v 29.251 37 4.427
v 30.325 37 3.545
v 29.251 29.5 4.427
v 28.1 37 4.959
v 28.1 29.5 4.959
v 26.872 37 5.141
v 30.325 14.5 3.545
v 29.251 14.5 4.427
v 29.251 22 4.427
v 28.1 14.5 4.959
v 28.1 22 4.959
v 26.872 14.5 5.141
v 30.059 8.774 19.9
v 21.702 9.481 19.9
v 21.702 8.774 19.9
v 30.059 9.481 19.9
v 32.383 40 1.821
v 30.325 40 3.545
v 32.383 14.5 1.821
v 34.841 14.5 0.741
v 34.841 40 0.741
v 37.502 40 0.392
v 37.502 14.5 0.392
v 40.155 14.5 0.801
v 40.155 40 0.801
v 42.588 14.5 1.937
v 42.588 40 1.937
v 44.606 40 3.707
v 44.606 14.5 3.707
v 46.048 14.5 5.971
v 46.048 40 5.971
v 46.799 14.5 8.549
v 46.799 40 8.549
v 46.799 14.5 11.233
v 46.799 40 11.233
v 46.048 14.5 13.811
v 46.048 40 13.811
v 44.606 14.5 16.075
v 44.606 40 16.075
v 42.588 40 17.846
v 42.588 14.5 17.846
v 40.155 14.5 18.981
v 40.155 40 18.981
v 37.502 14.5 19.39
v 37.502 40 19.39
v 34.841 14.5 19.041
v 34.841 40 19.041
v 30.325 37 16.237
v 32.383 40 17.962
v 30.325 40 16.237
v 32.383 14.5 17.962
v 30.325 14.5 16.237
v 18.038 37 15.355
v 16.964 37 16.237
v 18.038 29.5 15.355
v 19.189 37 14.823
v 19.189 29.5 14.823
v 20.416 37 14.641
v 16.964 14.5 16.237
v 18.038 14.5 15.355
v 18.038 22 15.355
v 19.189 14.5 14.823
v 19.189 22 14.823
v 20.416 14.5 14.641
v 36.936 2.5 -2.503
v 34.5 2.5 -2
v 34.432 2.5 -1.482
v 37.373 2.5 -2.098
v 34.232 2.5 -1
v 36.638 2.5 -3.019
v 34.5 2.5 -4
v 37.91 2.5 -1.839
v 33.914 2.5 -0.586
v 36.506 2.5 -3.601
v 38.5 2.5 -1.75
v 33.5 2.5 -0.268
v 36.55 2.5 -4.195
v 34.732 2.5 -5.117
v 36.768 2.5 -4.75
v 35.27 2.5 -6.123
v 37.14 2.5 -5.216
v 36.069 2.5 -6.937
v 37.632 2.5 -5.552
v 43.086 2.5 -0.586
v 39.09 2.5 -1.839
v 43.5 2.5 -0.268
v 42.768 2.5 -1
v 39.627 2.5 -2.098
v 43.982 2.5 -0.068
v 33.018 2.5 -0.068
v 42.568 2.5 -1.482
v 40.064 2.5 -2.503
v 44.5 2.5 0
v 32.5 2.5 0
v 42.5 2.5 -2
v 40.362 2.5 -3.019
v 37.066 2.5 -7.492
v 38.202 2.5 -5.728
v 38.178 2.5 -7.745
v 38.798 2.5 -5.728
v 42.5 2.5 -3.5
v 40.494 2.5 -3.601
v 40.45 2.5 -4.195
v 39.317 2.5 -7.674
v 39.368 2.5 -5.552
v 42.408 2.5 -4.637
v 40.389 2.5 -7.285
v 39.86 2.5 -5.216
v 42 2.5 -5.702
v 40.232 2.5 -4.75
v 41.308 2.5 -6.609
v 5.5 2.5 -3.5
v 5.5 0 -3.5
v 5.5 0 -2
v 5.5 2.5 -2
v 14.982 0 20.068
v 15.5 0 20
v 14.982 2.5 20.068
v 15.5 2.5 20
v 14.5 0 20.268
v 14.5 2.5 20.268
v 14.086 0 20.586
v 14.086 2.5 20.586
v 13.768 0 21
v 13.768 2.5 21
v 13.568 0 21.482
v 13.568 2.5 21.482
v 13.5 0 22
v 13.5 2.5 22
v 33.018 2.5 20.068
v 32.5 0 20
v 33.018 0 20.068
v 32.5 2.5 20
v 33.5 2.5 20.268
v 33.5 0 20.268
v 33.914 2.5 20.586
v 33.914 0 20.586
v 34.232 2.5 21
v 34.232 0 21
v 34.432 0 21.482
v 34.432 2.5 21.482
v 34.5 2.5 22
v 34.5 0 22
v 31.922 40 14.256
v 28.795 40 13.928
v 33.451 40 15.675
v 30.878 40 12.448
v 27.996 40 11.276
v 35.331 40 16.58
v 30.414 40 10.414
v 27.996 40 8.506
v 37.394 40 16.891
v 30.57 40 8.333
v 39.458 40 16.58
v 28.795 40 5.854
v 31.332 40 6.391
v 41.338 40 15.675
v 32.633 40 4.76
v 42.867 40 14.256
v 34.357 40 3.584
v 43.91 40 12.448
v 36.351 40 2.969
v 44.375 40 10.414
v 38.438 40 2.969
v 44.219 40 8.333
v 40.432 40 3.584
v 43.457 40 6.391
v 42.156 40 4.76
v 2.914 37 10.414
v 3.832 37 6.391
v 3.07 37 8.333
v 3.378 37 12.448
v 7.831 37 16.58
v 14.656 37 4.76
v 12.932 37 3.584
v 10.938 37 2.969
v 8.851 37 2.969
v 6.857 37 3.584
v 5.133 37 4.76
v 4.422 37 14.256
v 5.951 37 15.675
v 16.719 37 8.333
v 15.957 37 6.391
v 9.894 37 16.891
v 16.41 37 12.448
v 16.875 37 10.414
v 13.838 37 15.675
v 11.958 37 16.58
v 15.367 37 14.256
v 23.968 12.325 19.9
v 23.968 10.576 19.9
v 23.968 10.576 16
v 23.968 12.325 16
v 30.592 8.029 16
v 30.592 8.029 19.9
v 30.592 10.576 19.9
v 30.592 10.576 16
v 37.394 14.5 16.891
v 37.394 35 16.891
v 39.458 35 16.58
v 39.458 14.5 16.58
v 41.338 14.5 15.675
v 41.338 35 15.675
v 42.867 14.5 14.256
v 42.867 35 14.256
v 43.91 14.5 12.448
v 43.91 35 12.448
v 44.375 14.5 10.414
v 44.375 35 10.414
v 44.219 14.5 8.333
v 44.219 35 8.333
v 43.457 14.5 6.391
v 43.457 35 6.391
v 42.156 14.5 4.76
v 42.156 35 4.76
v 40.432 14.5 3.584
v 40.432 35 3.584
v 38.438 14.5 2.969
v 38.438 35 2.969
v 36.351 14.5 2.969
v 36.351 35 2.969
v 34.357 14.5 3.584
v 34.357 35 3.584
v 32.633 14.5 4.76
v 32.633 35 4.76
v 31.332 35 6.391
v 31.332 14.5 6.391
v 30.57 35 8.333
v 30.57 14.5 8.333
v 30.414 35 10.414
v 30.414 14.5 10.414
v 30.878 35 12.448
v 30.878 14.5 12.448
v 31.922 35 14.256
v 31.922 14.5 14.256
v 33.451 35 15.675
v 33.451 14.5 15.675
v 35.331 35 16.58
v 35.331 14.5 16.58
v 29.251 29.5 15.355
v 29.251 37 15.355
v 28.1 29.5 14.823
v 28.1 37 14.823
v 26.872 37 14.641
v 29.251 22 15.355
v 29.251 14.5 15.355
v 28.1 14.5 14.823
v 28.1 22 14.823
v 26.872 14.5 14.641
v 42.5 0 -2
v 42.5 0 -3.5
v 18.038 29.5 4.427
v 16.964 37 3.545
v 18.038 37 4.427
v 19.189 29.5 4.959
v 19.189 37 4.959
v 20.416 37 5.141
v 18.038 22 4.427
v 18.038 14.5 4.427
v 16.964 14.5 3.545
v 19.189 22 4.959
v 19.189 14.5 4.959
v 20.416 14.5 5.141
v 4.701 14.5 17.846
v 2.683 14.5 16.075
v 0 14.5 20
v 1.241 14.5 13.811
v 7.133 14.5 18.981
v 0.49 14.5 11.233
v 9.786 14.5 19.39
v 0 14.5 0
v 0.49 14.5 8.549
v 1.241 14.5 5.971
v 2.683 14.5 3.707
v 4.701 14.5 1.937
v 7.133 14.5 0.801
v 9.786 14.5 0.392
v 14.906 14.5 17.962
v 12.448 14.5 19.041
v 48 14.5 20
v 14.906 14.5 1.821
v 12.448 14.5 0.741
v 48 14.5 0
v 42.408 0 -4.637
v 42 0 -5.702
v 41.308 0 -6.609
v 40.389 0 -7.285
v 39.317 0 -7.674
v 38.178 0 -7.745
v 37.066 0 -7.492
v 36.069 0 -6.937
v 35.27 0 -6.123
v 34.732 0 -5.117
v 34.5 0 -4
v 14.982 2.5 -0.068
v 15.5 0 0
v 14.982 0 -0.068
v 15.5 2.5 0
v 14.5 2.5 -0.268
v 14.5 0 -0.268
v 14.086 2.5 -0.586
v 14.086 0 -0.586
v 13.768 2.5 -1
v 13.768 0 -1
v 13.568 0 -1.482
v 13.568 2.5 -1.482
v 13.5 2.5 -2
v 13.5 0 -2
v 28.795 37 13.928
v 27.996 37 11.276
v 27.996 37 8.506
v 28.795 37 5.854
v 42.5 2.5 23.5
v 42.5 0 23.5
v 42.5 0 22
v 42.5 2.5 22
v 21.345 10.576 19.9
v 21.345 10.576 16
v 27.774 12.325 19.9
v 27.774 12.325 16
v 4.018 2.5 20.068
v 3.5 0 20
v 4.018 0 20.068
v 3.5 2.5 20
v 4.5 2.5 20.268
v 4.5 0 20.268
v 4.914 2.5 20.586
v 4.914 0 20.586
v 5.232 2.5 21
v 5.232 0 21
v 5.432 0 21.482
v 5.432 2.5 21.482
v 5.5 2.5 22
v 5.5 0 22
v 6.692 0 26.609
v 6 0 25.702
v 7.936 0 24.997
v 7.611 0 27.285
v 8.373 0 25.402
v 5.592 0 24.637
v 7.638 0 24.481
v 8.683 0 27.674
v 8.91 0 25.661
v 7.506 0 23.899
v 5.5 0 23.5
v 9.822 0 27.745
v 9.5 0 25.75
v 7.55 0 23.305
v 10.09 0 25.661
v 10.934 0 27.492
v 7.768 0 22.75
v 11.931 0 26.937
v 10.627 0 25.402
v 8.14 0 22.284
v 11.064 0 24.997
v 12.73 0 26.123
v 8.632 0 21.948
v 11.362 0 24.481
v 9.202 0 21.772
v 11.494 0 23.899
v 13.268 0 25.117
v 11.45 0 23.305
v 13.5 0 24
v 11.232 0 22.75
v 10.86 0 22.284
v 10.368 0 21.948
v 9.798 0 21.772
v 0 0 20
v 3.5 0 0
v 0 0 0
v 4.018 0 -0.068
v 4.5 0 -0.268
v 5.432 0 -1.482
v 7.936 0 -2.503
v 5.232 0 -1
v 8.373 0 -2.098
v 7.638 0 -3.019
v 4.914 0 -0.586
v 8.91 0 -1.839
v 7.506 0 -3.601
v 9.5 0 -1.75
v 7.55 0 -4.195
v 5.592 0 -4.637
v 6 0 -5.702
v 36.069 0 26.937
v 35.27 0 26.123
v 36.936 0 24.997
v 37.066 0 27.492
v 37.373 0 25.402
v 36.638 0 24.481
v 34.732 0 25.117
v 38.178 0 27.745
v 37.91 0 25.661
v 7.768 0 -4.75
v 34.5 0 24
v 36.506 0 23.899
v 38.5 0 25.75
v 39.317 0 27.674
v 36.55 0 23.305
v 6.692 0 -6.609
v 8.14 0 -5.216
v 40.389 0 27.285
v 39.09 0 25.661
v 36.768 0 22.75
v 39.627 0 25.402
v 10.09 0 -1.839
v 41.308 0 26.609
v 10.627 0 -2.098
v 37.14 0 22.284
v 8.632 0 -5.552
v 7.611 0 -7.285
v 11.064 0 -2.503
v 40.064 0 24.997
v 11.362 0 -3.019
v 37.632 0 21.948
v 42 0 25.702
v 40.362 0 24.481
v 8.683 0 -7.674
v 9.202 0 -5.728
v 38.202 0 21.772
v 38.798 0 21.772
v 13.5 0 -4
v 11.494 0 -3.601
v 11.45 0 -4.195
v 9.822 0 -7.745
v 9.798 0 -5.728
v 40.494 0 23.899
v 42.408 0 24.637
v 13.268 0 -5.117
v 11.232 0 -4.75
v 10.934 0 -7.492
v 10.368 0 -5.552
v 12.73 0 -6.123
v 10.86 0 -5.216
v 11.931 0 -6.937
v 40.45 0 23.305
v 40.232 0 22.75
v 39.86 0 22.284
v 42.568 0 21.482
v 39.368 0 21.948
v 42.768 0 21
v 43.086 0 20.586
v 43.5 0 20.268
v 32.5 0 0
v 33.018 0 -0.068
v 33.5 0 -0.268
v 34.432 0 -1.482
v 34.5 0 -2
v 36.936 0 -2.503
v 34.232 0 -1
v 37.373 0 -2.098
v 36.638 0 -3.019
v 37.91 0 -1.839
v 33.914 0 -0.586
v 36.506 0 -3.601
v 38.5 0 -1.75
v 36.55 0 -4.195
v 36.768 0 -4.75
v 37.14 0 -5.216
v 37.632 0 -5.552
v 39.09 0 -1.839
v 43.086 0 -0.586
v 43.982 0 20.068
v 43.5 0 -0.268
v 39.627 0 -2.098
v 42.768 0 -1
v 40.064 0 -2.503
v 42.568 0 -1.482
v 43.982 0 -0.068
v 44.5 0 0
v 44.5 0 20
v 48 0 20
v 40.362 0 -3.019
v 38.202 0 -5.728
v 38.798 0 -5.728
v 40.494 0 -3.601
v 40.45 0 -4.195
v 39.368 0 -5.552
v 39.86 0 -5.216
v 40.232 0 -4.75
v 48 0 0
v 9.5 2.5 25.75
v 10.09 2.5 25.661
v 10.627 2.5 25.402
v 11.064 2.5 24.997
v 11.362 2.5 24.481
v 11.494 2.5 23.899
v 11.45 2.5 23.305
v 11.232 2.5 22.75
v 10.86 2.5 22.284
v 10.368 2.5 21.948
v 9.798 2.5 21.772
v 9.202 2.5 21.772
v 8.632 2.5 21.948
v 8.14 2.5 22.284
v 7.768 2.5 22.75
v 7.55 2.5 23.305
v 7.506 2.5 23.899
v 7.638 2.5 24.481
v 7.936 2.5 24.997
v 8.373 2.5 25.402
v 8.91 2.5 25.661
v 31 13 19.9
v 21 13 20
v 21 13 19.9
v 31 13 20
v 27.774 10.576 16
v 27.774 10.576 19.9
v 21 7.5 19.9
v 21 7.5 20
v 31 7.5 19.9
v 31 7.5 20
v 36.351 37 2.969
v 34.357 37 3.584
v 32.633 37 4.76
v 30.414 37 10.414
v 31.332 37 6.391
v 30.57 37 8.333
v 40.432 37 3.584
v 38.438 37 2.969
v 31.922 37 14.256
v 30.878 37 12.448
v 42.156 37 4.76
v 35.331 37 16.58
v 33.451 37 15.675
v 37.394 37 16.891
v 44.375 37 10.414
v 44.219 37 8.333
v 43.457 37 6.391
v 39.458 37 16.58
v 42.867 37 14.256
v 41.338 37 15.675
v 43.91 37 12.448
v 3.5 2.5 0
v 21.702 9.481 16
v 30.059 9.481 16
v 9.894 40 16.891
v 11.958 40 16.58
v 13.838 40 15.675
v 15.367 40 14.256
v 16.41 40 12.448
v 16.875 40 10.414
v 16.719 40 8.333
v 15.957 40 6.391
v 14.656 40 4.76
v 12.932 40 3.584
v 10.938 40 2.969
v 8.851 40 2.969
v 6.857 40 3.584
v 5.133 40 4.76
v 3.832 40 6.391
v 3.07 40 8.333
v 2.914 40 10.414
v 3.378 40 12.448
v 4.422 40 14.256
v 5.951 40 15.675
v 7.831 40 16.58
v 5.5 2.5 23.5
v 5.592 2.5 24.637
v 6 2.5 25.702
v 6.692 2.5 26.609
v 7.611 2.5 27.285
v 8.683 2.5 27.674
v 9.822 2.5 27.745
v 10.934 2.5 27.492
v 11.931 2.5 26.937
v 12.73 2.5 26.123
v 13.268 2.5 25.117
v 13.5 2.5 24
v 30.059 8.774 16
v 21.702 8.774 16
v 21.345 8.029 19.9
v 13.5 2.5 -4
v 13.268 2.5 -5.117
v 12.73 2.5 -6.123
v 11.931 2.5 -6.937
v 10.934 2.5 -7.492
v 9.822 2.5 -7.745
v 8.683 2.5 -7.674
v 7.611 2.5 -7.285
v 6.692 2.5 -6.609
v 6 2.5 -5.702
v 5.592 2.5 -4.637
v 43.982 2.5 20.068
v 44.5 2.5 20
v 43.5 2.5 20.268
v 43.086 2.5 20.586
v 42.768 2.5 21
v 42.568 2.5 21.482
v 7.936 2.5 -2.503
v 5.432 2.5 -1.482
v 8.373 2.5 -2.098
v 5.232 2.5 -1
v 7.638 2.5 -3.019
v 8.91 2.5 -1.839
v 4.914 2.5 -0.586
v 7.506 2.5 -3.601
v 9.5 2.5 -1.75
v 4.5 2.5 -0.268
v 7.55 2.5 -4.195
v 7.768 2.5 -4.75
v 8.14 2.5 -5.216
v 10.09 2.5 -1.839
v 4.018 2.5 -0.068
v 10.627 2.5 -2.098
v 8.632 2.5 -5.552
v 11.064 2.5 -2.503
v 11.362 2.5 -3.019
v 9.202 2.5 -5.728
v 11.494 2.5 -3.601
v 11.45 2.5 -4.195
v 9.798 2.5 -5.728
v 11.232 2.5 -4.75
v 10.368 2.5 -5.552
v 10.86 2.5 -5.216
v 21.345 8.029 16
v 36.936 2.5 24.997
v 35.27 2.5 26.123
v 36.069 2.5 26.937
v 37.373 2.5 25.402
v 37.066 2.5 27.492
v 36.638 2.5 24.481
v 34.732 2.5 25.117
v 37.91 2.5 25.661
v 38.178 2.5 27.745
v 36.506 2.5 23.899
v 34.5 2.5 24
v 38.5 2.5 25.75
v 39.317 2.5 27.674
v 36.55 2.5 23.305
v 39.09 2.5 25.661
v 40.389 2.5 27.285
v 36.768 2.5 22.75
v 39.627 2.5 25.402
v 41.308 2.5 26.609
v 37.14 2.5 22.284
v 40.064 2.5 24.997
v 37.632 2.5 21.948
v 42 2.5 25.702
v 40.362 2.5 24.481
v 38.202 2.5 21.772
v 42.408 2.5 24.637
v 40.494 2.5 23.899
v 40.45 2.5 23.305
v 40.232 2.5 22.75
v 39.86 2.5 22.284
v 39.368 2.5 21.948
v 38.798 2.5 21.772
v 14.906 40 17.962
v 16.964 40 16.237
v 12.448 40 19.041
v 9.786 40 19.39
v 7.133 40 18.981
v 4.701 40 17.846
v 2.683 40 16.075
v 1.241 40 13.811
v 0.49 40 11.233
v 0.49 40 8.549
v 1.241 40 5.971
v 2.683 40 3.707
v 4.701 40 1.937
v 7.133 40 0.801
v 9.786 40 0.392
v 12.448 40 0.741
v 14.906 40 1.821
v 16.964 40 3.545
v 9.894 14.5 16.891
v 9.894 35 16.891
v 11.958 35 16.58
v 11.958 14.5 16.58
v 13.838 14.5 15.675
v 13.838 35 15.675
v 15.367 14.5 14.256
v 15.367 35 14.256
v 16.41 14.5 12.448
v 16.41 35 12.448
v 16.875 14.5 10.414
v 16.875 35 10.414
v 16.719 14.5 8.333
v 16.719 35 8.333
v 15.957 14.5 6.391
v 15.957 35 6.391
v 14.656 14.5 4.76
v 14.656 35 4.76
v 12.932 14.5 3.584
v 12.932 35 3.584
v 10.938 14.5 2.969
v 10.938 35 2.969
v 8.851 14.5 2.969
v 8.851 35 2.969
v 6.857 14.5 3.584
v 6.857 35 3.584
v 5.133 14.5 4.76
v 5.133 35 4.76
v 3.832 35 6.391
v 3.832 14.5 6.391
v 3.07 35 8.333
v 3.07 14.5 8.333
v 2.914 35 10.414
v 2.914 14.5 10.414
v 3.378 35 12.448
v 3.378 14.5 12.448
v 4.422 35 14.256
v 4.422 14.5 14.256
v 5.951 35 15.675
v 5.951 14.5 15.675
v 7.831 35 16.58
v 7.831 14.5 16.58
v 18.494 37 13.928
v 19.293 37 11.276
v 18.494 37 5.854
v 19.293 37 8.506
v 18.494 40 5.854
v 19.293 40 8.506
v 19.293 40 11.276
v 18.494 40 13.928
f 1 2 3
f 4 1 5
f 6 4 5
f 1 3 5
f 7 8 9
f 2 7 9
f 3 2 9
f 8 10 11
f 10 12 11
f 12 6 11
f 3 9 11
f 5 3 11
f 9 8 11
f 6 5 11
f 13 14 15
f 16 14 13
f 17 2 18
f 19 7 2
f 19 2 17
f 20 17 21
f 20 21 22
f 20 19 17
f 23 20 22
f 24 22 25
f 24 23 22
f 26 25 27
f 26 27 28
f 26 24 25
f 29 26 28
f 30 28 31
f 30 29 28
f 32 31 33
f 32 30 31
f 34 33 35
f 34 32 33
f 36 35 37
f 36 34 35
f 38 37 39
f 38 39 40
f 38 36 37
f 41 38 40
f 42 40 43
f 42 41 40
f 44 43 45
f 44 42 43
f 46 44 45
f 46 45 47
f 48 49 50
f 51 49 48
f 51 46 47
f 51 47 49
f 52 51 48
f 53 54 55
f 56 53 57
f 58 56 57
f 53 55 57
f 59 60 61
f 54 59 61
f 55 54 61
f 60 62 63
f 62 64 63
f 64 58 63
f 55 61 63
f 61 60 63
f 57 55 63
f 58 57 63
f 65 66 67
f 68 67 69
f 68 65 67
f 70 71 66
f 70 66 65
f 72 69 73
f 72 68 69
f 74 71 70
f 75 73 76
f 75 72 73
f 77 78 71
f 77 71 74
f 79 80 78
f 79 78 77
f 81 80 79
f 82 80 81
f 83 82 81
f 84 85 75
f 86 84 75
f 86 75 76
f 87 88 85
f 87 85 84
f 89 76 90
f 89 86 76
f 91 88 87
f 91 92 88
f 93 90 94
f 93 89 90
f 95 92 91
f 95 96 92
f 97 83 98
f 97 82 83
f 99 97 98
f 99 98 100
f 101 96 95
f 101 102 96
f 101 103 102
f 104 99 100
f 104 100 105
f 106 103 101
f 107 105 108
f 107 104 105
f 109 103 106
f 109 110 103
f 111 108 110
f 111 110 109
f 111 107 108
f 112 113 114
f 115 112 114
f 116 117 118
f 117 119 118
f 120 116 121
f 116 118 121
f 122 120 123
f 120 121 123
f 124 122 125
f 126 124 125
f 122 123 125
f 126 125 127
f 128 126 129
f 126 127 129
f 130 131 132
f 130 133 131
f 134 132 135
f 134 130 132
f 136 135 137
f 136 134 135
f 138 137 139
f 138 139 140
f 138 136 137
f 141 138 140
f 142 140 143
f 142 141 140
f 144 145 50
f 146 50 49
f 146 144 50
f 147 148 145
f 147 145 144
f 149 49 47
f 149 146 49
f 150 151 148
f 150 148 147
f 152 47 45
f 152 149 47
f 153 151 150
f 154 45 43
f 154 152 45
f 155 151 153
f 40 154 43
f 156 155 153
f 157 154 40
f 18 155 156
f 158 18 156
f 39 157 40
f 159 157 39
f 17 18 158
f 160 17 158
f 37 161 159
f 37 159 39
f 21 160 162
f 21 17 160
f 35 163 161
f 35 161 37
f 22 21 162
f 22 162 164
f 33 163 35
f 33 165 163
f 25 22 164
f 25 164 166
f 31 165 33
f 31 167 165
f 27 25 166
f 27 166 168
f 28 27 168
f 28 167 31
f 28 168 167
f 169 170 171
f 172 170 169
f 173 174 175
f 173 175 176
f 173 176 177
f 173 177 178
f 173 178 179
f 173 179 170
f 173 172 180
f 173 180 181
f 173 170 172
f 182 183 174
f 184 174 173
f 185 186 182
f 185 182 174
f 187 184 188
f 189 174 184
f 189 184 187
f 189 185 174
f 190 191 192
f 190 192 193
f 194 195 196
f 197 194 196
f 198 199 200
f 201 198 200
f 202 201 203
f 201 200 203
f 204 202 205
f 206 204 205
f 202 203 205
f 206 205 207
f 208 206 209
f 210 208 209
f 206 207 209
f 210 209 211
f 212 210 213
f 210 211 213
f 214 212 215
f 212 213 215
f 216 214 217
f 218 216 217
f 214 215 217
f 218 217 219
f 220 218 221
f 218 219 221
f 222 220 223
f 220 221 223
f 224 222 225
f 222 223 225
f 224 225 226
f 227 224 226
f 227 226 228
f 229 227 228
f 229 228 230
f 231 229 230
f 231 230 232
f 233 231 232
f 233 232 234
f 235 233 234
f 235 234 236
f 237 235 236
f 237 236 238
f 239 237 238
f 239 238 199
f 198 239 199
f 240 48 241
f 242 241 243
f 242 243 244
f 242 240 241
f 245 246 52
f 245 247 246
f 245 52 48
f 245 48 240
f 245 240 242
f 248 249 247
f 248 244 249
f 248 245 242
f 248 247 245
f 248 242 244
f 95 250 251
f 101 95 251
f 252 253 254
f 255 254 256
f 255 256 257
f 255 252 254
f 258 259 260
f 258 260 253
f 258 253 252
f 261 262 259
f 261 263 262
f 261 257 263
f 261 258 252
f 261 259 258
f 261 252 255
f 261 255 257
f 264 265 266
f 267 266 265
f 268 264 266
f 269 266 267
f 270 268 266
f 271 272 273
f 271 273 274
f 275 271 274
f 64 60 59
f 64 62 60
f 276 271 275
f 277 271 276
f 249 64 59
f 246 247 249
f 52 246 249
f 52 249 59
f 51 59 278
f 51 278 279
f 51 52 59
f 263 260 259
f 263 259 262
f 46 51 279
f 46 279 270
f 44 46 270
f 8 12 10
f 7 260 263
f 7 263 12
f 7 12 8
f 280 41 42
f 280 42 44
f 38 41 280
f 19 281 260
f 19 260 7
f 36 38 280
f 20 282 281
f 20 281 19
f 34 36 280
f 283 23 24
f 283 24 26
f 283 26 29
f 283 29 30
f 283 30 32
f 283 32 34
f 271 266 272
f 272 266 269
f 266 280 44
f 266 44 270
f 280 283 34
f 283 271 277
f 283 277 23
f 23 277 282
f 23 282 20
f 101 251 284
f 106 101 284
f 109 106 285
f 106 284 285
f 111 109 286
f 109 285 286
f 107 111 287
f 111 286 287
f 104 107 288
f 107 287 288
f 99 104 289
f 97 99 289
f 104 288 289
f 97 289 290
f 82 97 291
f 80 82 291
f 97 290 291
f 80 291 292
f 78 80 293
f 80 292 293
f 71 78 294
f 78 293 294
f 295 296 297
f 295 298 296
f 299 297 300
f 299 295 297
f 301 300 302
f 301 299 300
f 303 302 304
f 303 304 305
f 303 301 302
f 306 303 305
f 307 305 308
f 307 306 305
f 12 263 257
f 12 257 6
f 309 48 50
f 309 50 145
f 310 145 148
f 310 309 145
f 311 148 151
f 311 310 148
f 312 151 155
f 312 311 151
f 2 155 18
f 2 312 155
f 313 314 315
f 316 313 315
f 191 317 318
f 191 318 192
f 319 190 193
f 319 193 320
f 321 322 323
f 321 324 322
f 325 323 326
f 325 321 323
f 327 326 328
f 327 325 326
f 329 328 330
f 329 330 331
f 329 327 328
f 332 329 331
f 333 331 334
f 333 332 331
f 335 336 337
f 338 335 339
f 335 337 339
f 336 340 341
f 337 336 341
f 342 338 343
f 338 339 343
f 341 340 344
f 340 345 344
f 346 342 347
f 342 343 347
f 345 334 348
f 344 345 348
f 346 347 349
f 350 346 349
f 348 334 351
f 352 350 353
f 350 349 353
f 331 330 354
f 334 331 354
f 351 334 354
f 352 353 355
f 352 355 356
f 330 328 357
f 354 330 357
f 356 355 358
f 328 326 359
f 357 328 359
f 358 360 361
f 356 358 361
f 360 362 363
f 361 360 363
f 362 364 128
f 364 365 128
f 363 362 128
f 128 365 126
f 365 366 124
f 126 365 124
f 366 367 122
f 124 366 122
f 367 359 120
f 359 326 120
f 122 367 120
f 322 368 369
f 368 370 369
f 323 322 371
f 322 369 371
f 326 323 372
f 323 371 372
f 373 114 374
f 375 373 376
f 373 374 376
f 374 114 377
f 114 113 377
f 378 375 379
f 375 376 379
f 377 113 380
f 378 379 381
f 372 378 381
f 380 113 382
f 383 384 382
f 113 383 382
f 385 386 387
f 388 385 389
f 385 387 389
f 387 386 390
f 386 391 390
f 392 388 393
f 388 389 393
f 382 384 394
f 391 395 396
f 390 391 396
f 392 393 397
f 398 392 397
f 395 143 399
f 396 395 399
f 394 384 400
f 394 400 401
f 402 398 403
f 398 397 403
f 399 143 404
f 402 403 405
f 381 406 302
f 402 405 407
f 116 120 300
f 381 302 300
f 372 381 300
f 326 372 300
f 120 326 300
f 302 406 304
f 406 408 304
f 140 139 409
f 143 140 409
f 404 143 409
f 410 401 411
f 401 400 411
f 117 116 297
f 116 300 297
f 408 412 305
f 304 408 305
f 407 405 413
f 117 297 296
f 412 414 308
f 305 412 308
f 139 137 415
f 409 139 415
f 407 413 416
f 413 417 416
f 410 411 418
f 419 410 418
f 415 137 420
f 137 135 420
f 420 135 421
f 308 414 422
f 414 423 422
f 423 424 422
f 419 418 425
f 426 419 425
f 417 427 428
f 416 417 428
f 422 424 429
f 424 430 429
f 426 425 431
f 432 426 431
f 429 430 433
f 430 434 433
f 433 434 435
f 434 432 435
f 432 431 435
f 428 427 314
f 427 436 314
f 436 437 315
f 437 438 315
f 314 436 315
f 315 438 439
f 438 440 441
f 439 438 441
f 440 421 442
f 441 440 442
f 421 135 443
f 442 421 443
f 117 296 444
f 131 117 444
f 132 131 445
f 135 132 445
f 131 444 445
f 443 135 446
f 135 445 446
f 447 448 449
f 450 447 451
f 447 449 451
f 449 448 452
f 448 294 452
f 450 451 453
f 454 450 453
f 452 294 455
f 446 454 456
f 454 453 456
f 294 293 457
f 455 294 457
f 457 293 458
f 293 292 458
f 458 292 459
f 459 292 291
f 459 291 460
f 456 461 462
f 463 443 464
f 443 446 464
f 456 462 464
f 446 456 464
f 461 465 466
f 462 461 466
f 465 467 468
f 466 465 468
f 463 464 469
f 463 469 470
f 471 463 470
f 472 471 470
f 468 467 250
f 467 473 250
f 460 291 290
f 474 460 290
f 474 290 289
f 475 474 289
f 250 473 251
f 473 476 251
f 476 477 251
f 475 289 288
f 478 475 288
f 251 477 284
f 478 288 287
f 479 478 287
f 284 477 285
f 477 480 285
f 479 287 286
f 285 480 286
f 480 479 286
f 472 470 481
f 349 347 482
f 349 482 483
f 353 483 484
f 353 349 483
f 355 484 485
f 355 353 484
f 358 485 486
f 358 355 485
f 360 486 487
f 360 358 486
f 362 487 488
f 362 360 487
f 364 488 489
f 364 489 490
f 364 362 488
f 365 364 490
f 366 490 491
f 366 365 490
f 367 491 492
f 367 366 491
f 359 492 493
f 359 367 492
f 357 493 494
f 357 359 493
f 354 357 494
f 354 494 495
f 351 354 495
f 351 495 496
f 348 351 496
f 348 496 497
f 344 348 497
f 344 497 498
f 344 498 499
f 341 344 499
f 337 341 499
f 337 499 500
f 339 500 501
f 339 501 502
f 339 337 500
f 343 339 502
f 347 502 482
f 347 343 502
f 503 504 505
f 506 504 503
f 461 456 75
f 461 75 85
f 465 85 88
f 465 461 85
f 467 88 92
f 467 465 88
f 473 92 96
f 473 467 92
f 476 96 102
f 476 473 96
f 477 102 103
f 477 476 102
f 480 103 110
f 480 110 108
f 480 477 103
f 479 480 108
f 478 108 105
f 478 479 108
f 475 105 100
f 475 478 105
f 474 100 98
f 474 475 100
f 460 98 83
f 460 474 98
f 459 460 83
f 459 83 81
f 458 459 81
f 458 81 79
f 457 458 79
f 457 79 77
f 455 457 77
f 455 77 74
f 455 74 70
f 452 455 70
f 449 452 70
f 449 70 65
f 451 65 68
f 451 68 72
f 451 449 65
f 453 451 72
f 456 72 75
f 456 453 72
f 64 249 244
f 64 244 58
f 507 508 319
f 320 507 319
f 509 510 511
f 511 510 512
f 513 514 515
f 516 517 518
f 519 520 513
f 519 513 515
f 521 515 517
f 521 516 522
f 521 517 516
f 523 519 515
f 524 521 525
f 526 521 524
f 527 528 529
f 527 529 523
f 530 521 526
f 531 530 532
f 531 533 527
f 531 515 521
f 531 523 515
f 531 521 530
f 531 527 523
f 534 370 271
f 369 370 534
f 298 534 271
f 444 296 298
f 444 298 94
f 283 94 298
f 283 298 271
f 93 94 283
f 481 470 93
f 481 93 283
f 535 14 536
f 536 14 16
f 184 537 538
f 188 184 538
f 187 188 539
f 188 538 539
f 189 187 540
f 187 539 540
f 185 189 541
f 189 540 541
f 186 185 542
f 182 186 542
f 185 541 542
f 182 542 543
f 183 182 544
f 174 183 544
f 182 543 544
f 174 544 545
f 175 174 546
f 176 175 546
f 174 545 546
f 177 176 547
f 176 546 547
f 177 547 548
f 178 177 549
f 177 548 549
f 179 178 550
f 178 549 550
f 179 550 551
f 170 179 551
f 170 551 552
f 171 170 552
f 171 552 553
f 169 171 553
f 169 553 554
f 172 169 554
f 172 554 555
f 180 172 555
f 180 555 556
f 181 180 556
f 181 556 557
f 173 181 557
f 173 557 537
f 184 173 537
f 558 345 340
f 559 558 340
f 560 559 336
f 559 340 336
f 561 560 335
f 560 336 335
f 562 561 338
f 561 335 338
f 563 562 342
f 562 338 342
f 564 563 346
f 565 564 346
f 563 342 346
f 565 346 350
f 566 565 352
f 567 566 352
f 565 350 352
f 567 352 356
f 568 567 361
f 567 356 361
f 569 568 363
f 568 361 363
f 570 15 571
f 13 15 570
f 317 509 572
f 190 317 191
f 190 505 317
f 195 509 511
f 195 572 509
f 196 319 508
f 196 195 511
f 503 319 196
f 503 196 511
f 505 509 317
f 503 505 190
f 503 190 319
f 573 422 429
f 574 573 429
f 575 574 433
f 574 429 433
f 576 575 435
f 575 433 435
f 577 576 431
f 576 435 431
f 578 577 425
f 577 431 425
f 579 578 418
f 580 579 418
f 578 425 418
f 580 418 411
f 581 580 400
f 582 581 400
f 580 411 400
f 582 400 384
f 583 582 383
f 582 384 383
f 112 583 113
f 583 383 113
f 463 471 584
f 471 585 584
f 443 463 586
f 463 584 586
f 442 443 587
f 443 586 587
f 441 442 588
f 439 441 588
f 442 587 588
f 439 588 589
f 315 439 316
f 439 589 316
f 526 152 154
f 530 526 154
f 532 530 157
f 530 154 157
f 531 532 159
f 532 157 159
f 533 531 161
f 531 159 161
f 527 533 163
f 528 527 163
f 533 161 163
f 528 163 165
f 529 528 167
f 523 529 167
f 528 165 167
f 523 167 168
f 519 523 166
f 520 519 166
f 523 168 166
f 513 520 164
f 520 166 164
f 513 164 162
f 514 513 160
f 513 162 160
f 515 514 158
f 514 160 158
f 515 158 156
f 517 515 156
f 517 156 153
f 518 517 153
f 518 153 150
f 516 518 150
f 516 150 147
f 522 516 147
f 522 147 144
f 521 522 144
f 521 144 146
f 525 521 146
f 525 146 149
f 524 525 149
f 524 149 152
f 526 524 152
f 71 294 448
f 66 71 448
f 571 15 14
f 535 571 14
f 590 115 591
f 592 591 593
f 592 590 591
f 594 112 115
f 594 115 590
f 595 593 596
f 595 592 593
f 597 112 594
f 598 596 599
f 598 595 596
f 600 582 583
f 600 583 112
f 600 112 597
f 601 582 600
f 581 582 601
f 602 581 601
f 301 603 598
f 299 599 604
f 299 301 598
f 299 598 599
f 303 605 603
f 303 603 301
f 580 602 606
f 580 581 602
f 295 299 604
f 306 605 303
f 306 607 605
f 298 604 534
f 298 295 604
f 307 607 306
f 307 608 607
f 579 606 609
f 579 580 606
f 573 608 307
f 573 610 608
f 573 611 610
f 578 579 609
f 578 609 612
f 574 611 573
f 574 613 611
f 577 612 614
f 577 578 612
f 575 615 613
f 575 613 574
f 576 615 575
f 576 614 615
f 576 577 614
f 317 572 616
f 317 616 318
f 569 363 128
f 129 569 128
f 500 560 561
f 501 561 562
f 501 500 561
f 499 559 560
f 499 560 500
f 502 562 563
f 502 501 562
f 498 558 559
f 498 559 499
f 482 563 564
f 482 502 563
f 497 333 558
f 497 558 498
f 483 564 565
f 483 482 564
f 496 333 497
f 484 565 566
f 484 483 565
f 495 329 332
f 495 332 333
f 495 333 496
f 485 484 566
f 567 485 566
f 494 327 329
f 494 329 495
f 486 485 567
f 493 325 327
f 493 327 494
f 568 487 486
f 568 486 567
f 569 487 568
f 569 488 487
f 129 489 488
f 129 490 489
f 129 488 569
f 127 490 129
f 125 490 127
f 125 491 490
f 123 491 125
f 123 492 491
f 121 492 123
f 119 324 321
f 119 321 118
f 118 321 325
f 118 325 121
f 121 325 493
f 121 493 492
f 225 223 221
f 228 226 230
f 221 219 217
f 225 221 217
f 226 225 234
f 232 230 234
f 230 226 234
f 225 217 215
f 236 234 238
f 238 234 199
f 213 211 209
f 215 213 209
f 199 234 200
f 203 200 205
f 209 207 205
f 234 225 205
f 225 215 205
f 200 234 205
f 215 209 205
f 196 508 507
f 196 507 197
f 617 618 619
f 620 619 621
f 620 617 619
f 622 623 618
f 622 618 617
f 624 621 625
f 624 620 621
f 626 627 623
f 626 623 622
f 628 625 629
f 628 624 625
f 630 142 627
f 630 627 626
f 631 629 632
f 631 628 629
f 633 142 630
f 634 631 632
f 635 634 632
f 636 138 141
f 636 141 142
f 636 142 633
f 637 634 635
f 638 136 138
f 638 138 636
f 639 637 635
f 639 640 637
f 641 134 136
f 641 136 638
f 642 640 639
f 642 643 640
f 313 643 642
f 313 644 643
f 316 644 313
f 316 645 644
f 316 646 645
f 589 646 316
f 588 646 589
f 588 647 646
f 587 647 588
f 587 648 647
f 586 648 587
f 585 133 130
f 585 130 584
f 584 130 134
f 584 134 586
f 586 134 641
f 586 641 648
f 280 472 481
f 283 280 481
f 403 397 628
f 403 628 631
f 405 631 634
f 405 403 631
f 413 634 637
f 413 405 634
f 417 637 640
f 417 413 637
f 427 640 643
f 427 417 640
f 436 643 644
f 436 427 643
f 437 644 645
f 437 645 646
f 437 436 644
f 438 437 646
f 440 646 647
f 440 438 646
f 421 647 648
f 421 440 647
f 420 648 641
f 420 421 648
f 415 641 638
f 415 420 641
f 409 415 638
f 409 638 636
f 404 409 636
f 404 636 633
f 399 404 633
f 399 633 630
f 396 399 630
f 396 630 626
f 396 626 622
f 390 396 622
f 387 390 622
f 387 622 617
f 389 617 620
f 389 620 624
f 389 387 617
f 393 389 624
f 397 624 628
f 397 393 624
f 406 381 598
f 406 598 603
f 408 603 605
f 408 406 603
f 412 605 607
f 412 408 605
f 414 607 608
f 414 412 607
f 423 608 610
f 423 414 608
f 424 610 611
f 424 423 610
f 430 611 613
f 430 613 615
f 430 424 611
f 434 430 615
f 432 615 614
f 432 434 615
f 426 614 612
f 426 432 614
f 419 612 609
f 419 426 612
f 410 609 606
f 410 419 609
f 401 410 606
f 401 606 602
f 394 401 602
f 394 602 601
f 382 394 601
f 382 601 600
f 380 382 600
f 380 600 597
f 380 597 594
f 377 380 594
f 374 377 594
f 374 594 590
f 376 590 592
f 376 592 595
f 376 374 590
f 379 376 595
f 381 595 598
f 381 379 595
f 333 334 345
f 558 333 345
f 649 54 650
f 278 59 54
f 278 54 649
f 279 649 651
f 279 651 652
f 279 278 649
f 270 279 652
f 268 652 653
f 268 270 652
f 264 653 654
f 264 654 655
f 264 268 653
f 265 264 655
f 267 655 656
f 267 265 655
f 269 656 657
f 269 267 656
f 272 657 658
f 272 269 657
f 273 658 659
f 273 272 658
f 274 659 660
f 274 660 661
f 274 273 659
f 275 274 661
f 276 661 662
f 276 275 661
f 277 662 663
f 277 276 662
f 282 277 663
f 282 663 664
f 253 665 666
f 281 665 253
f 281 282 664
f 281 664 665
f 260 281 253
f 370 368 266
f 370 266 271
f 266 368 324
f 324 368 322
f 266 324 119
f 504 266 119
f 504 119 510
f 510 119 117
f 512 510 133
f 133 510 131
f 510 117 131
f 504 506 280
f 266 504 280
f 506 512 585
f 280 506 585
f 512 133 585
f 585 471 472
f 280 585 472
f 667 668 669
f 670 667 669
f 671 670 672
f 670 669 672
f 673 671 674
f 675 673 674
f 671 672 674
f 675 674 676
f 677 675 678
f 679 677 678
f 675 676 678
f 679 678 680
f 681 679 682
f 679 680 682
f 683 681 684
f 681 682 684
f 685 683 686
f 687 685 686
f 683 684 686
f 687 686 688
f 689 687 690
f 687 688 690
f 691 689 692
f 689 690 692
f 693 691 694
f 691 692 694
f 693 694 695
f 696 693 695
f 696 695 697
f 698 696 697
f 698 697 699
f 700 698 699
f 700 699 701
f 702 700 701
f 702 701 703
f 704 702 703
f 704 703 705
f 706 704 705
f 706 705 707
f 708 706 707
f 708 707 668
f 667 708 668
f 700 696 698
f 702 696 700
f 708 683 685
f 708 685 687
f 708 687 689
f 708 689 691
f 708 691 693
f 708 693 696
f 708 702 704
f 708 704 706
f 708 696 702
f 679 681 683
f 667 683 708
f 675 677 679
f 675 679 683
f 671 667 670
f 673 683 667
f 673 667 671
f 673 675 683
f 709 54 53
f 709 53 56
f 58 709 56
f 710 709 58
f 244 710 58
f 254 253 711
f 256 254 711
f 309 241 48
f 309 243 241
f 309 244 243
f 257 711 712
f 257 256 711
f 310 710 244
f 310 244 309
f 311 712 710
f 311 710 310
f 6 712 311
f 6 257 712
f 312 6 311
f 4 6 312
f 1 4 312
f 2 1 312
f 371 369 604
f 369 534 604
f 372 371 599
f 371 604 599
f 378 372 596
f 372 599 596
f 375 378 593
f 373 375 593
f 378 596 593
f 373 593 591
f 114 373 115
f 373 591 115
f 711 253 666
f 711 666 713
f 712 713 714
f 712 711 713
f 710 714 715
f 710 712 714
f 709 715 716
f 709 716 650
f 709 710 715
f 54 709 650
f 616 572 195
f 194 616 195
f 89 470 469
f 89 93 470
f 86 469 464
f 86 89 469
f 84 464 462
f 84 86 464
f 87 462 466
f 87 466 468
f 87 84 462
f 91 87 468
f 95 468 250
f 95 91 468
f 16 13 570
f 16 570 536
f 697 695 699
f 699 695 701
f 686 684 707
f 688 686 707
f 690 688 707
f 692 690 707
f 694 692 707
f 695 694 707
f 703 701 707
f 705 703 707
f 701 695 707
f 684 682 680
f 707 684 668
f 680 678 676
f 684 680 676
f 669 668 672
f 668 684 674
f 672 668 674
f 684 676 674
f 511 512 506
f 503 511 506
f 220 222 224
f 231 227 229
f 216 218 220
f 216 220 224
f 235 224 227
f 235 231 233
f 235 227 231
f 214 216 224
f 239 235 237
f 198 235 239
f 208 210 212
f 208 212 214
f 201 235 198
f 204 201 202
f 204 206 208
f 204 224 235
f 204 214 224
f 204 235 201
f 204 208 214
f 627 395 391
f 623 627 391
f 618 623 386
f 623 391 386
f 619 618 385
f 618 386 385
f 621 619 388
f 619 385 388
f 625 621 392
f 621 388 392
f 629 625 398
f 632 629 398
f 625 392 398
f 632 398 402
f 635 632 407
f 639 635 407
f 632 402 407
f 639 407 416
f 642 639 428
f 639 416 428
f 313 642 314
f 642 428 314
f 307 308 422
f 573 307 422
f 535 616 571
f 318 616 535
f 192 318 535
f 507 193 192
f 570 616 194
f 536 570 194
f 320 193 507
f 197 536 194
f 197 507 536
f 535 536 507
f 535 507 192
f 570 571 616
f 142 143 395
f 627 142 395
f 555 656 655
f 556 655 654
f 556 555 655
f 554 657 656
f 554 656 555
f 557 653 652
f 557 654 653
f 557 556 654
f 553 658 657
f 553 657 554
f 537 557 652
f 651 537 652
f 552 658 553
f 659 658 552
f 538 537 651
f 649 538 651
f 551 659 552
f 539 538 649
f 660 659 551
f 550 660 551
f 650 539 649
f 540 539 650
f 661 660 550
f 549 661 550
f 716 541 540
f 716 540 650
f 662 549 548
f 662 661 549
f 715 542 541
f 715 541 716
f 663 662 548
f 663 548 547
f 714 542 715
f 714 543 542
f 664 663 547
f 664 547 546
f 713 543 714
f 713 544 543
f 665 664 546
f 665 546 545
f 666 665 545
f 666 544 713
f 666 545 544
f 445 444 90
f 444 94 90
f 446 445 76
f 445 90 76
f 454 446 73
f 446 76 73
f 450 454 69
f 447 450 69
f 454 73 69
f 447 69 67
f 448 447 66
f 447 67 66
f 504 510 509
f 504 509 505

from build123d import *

# Parameters (mm, degrees)
ESQUISSE1_W                 = 48
ESQUISSE1_H                 = 20
BOSS_EXTRU_2_DEPTH          = 40
ESQUISSE1_3_R               = 2
BOSS_EXTRU_4_DEPTH          = 2.5
CONG_1_R                    = 2
ENL_V_START                 = -25.5
ENL_V_MAT_EXTRU_2_OUTLINE_W = 48
ENL_V_MAT_EXTRU_2_OUTLINE_H = 20
ENL_V_MAT_EXTRU_2_DEPTH     = 25.5
ENL_V_START_2               = -3
ENL_V_MAT_EXTRU_3_DEPTH     = 3
ESQUISSE3_5_R               = 7
ENL_V_MAT_EXTRU_4_DEPTH     = 25.5
ESQUISSE8_R                 = 7
BOSS_EXTRU_5_DEPTH          = 2
ESQUISSE9_W                 = 3.806741441
ESQUISSE9_H                 = 1.749254543
ENL_V_MAT_EXTRU_5_DEPTH     = 4
ESQUISSE9_3_W               = 9.246461273
ESQUISSE9_3_H               = 2.546264857
ESQUISSE9_3_W_2             = 8.356621676
ESQUISSE9_3_H_2             = 0.706512752
ENL_V_MAT_EXTRU_6_DEPTH     = 4
ESQUISSE9_5_W               = 10
ESQUISSE9_5_H               = 5.5
ENL_V_MAT_EXTRU_7_DEPTH     = 0.1


# Read off the part's stored shape, not the designer's step: Enlèv. mat.-Extru.2, Enlèv. mat.-Extru.3
with BuildPart() as part:
    # Esquisse1 → Boss.-Extru.2 (new body)
    with BuildSketch(Plane(origin=(0, 0, 0), x_dir=(1, 0, 0), z_dir=(0, 1, 0))):
        with Locations((24, -10)):
            Rectangle(ESQUISSE1_W, ESQUISSE1_H)
    extrude(amount=BOSS_EXTRU_2_DEPTH)

    # Esquisse1<3> → Boss.-Extru.4 (add)
    # profile 1 of 4: a face of its own
    with BuildSketch(Plane(origin=(0, 0, 0), x_dir=(1, 0, 0), z_dir=(0, 1, 0))):
        with BuildLine():
            Line((13.5, -20), (5.5, -20))
            Line((5.5, -20), (5.5, -23.5))
            ThreePointArc((5.5, -23.5), (9.25, -27.75), (13.5, -24))
            Line((13.5, -24), (13.5, -20))
        make_face()
        with Locations(Location((9.5, -23.75, 0), (0, 0, 270))):
            Circle(ESQUISSE1_3_R, mode=Mode.SUBTRACT)
    # profile 2 of 4: a face of its own
    with BuildSketch(Plane(origin=(0, 0, 0), x_dir=(1, 0, 0), z_dir=(0, 1, 0))):
        with BuildLine():
            Line((42.5, -20), (34.5, -20))
            Line((34.5, -20), (34.5, -24))
            ThreePointArc((34.5, -24), (38.75, -27.75), (42.5, -23.5))
            Line((42.5, -23.5), (42.5, -20))
        make_face()
        with Locations(Location((38.5, -23.75, 0), (0, 0, 270))):
            Circle(ESQUISSE1_3_R, mode=Mode.SUBTRACT)
    # profile 3 of 4: a face of its own
    with BuildSketch(Plane(origin=(0, 0, 0), x_dir=(1, 0, 0), z_dir=(0, 1, 0))):
        with BuildLine():
            Line((5.5, 3.5), (5.5, 0))
            Line((5.5, 0), (13.5, 0))
            Line((13.5, 0), (13.5, 4))
            ThreePointArc((13.5, 4), (9.25, 7.75), (5.5, 3.5))
        make_face()
        with Locations(Location((9.5, 3.75, 0), (0, 0, 270))):
            Circle(ESQUISSE1_3_R, mode=Mode.SUBTRACT)
    # profile 4 of 4: a face of its own
    with BuildSketch(Plane(origin=(0, 0, 0), x_dir=(1, 0, 0), z_dir=(0, 1, 0))):
        with BuildLine():
            Line((34.5, 4), (34.5, 0))
            Line((34.5, 0), (42.5, 0))
            Line((42.5, 0), (42.5, 3.5))
            ThreePointArc((42.5, 3.5), (38.75, 7.75), (34.5, 4))
        make_face()
        with Locations(Location((38.5, 3.75, 0), (0, 0, 270))):
            Circle(ESQUISSE1_3_R, mode=Mode.SUBTRACT)
    extrude(amount=BOSS_EXTRU_4_DEPTH)

    # Congé1
    cong_1_edges = [part.edges().sort_by_distance(p)[0] for p in [
        (42.5, 1.25, 0),
        (34.5, 1.25, 0),
        (13.5, 1.25, 0),
        (5.5, 1.25, 0),
        (34.5, 1.25, 20),
        (42.5, 1.25, 20),
        (13.5, 1.25, 20),
        (5.5, 1.25, 20),
    ]]
    fillet(cong_1_edges, radius=CONG_1_R)

    # Enlèv. mat.-Extru.2 outline → Enlèv. mat.-Extru.2 (cut)
    with BuildSketch(Plane(origin=(0, 40, 0), x_dir=(1, 0, 0), z_dir=(0, 1, 0)).offset(ENL_V_START)):
        with Locations((24, -10)):
            Rectangle(ENL_V_MAT_EXTRU_2_OUTLINE_W, ENL_V_MAT_EXTRU_2_OUTLINE_H)
        with BuildLine():
            add(Edge.make_bspline(
                [(16.963589169, -16.237376104), (17.999093762, -15.180393065), (19.150056624, -14.648292989), (20.416477791, -14.641075876)],
                knots=[0, 0, 0, 0, 0.986436325, 0.986436325, 0.986436325, 0.986436325], degree=3))
            ThreePointArc((16.963589169, -16.237376104), (0.394326585, -9.891075881), (16.963589169, -3.544775658))
            add(Edge.make_bspline(
                [(16.963589169, -3.544775658), (17.999093762, -4.601758697), (19.150056624, -5.133858773), (20.416477791, -5.141075886)],
                knots=[0, 0, 0, 0, 0.986436325, 0.986436325, 0.986436325, 0.986436325], degree=3))
            Line((20.416477791, -5.141075886), (26.872175379, -5.141075886))
            add(Edge.make_bspline(
                [(30.325064001, -3.544775658), (29.289559409, -4.601758697), (28.138596547, -5.133858773), (26.872175379, -5.141075886)],
                knots=[0, 0, 0, 0, 0.986436325, 0.986436325, 0.986436325, 0.986436325], degree=3))
            ThreePointArc((30.325064001, -3.544775658), (46.894326585, -9.891075881), (30.325064001, -16.237376104))
            add(Edge.make_bspline(
                [(30.325064001, -16.237376104), (29.289559409, -15.180393065), (28.138596547, -14.648292989), (26.872175379, -14.641075876)],
                knots=[0, 0, 0, 0, 0.986436325, 0.986436325, 0.986436325, 0.986436325], degree=3))
            Line((26.872175379, -14.641075876), (20.416477791, -14.641075876))
        make_face(mode=Mode.SUBTRACT)
    extrude(amount=ENL_V_MAT_EXTRU_2_DEPTH, mode=Mode.SUBTRACT)

    # Enlèv. mat.-Extru.3 outline → Enlèv. mat.-Extru.3 (cut)
    with BuildSketch(Plane(origin=(0, 40, 0), x_dir=(1, 0, 0), z_dir=(0, 1, 0)).offset(ENL_V_START_2)):
        with BuildLine():
            ThreePointArc((30.325064001, -16.237376104), (27.894326585, -9.891075881), (30.325064001, -3.544775658))
            add(Edge.make_bspline(
                [(30.325064001, -3.544775658), (29.289559409, -4.601758697), (28.138596547, -5.133858773), (26.872175379, -5.141075886)],
                knots=[0, 0, 0, 0, 0.986436325, 0.986436325, 0.986436325, 0.986436325], degree=3))
            Line((26.872175379, -5.141075886), (20.416477791, -5.141075886))
            add(Edge.make_bspline(
                [(16.963589169, -3.544775658), (17.999093762, -4.601758697), (19.150056624, -5.133858773), (20.416477791, -5.141075886)],
                knots=[0, 0, 0, 0, 0.986436325, 0.986436325, 0.986436325, 0.986436325], degree=3))
            ThreePointArc((16.963589169, -3.544775658), (19.394326585, -9.891075881), (16.963589169, -16.237376104))
            add(Edge.make_bspline(
                [(16.963589169, -16.237376104), (17.999093762, -15.180393065), (19.150056624, -14.648292989), (20.416477791, -14.641075876)],
                knots=[0, 0, 0, 0, 0.986436325, 0.986436325, 0.986436325, 0.986436325], degree=3))
            Line((20.416477791, -14.641075876), (26.872175379, -14.641075876))
            add(Edge.make_bspline(
                [(30.325064001, -16.237376104), (29.289559409, -15.180393065), (28.138596547, -14.648292989), (26.872175379, -14.641075876)],
                knots=[0, 0, 0, 0, 0.986436325, 0.986436325, 0.986436325, 0.986436325], degree=3))
        make_face()
    extrude(amount=ENL_V_MAT_EXTRU_3_DEPTH, mode=Mode.SUBTRACT)

    # Esquisse3<5> → Enlèv. mat.-Extru.4 (cut)
    with BuildSketch(Plane(origin=(0, 40, 0), x_dir=(1, 0, 0), z_dir=(0, 1, 0))):
        with Locations(Location((9.894326585, -9.891075881, 0), (0, 0, 270))):
            Circle(ESQUISSE3_5_R)
        with Locations(Location((37.394326585, -9.891075881, 0), (0, 0, 270))):
            Circle(ESQUISSE3_5_R)
    extrude(amount=-ENL_V_MAT_EXTRU_4_DEPTH, mode=Mode.SUBTRACT)

    # Esquisse8 → Boss.-Extru.5 (add)
    with BuildSketch(Plane(origin=(0, 37, 0), x_dir=(1, 0, 0), z_dir=(0, 1, 0))):
        with Locations(Location((9.894326585, -9.891075881, 0), (0, 0, 270))):
            Circle(ESQUISSE8_R)
        with Locations(Location((37.394326585, -9.891075881, 0), (0, 0, 270))):
            Circle(ESQUISSE8_R)
    extrude(amount=-BOSS_EXTRU_5_DEPTH)

    # Esquisse9 → Enlèv. mat.-Extru.5 (cut)
    with BuildSketch(Plane.XY.offset(20)):
        with Locations((25.870972193, 11.450343865)):
            Rectangle(ESQUISSE9_W, ESQUISSE9_H)
    extrude(amount=-ENL_V_MAT_EXTRU_5_DEPTH, mode=Mode.SUBTRACT)

    # Esquisse9<3> → Enlèv. mat.-Extru.6 (cut)
    with BuildSketch(Plane.XY.offset(20)):
        with Locations((25.968514368, 9.302584165)):
            Rectangle(ESQUISSE9_3_W, ESQUISSE9_3_H)
        with Locations((25.880686529, 9.127251066)):
            Rectangle(ESQUISSE9_3_W_2, ESQUISSE9_3_H_2, mode=Mode.SUBTRACT)
    extrude(amount=-ENL_V_MAT_EXTRU_6_DEPTH, mode=Mode.SUBTRACT)

    # Esquisse9<5> → Enlèv. mat.-Extru.7 (cut)
    with BuildSketch(Plane.XY.offset(20)):
        with Locations((26, 10.25)):
            Rectangle(ESQUISSE9_5_W, ESQUISSE9_5_H)
    extrude(amount=-ENL_V_MAT_EXTRU_7_DEPTH, mode=Mode.SUBTRACT)


solid = part.part
